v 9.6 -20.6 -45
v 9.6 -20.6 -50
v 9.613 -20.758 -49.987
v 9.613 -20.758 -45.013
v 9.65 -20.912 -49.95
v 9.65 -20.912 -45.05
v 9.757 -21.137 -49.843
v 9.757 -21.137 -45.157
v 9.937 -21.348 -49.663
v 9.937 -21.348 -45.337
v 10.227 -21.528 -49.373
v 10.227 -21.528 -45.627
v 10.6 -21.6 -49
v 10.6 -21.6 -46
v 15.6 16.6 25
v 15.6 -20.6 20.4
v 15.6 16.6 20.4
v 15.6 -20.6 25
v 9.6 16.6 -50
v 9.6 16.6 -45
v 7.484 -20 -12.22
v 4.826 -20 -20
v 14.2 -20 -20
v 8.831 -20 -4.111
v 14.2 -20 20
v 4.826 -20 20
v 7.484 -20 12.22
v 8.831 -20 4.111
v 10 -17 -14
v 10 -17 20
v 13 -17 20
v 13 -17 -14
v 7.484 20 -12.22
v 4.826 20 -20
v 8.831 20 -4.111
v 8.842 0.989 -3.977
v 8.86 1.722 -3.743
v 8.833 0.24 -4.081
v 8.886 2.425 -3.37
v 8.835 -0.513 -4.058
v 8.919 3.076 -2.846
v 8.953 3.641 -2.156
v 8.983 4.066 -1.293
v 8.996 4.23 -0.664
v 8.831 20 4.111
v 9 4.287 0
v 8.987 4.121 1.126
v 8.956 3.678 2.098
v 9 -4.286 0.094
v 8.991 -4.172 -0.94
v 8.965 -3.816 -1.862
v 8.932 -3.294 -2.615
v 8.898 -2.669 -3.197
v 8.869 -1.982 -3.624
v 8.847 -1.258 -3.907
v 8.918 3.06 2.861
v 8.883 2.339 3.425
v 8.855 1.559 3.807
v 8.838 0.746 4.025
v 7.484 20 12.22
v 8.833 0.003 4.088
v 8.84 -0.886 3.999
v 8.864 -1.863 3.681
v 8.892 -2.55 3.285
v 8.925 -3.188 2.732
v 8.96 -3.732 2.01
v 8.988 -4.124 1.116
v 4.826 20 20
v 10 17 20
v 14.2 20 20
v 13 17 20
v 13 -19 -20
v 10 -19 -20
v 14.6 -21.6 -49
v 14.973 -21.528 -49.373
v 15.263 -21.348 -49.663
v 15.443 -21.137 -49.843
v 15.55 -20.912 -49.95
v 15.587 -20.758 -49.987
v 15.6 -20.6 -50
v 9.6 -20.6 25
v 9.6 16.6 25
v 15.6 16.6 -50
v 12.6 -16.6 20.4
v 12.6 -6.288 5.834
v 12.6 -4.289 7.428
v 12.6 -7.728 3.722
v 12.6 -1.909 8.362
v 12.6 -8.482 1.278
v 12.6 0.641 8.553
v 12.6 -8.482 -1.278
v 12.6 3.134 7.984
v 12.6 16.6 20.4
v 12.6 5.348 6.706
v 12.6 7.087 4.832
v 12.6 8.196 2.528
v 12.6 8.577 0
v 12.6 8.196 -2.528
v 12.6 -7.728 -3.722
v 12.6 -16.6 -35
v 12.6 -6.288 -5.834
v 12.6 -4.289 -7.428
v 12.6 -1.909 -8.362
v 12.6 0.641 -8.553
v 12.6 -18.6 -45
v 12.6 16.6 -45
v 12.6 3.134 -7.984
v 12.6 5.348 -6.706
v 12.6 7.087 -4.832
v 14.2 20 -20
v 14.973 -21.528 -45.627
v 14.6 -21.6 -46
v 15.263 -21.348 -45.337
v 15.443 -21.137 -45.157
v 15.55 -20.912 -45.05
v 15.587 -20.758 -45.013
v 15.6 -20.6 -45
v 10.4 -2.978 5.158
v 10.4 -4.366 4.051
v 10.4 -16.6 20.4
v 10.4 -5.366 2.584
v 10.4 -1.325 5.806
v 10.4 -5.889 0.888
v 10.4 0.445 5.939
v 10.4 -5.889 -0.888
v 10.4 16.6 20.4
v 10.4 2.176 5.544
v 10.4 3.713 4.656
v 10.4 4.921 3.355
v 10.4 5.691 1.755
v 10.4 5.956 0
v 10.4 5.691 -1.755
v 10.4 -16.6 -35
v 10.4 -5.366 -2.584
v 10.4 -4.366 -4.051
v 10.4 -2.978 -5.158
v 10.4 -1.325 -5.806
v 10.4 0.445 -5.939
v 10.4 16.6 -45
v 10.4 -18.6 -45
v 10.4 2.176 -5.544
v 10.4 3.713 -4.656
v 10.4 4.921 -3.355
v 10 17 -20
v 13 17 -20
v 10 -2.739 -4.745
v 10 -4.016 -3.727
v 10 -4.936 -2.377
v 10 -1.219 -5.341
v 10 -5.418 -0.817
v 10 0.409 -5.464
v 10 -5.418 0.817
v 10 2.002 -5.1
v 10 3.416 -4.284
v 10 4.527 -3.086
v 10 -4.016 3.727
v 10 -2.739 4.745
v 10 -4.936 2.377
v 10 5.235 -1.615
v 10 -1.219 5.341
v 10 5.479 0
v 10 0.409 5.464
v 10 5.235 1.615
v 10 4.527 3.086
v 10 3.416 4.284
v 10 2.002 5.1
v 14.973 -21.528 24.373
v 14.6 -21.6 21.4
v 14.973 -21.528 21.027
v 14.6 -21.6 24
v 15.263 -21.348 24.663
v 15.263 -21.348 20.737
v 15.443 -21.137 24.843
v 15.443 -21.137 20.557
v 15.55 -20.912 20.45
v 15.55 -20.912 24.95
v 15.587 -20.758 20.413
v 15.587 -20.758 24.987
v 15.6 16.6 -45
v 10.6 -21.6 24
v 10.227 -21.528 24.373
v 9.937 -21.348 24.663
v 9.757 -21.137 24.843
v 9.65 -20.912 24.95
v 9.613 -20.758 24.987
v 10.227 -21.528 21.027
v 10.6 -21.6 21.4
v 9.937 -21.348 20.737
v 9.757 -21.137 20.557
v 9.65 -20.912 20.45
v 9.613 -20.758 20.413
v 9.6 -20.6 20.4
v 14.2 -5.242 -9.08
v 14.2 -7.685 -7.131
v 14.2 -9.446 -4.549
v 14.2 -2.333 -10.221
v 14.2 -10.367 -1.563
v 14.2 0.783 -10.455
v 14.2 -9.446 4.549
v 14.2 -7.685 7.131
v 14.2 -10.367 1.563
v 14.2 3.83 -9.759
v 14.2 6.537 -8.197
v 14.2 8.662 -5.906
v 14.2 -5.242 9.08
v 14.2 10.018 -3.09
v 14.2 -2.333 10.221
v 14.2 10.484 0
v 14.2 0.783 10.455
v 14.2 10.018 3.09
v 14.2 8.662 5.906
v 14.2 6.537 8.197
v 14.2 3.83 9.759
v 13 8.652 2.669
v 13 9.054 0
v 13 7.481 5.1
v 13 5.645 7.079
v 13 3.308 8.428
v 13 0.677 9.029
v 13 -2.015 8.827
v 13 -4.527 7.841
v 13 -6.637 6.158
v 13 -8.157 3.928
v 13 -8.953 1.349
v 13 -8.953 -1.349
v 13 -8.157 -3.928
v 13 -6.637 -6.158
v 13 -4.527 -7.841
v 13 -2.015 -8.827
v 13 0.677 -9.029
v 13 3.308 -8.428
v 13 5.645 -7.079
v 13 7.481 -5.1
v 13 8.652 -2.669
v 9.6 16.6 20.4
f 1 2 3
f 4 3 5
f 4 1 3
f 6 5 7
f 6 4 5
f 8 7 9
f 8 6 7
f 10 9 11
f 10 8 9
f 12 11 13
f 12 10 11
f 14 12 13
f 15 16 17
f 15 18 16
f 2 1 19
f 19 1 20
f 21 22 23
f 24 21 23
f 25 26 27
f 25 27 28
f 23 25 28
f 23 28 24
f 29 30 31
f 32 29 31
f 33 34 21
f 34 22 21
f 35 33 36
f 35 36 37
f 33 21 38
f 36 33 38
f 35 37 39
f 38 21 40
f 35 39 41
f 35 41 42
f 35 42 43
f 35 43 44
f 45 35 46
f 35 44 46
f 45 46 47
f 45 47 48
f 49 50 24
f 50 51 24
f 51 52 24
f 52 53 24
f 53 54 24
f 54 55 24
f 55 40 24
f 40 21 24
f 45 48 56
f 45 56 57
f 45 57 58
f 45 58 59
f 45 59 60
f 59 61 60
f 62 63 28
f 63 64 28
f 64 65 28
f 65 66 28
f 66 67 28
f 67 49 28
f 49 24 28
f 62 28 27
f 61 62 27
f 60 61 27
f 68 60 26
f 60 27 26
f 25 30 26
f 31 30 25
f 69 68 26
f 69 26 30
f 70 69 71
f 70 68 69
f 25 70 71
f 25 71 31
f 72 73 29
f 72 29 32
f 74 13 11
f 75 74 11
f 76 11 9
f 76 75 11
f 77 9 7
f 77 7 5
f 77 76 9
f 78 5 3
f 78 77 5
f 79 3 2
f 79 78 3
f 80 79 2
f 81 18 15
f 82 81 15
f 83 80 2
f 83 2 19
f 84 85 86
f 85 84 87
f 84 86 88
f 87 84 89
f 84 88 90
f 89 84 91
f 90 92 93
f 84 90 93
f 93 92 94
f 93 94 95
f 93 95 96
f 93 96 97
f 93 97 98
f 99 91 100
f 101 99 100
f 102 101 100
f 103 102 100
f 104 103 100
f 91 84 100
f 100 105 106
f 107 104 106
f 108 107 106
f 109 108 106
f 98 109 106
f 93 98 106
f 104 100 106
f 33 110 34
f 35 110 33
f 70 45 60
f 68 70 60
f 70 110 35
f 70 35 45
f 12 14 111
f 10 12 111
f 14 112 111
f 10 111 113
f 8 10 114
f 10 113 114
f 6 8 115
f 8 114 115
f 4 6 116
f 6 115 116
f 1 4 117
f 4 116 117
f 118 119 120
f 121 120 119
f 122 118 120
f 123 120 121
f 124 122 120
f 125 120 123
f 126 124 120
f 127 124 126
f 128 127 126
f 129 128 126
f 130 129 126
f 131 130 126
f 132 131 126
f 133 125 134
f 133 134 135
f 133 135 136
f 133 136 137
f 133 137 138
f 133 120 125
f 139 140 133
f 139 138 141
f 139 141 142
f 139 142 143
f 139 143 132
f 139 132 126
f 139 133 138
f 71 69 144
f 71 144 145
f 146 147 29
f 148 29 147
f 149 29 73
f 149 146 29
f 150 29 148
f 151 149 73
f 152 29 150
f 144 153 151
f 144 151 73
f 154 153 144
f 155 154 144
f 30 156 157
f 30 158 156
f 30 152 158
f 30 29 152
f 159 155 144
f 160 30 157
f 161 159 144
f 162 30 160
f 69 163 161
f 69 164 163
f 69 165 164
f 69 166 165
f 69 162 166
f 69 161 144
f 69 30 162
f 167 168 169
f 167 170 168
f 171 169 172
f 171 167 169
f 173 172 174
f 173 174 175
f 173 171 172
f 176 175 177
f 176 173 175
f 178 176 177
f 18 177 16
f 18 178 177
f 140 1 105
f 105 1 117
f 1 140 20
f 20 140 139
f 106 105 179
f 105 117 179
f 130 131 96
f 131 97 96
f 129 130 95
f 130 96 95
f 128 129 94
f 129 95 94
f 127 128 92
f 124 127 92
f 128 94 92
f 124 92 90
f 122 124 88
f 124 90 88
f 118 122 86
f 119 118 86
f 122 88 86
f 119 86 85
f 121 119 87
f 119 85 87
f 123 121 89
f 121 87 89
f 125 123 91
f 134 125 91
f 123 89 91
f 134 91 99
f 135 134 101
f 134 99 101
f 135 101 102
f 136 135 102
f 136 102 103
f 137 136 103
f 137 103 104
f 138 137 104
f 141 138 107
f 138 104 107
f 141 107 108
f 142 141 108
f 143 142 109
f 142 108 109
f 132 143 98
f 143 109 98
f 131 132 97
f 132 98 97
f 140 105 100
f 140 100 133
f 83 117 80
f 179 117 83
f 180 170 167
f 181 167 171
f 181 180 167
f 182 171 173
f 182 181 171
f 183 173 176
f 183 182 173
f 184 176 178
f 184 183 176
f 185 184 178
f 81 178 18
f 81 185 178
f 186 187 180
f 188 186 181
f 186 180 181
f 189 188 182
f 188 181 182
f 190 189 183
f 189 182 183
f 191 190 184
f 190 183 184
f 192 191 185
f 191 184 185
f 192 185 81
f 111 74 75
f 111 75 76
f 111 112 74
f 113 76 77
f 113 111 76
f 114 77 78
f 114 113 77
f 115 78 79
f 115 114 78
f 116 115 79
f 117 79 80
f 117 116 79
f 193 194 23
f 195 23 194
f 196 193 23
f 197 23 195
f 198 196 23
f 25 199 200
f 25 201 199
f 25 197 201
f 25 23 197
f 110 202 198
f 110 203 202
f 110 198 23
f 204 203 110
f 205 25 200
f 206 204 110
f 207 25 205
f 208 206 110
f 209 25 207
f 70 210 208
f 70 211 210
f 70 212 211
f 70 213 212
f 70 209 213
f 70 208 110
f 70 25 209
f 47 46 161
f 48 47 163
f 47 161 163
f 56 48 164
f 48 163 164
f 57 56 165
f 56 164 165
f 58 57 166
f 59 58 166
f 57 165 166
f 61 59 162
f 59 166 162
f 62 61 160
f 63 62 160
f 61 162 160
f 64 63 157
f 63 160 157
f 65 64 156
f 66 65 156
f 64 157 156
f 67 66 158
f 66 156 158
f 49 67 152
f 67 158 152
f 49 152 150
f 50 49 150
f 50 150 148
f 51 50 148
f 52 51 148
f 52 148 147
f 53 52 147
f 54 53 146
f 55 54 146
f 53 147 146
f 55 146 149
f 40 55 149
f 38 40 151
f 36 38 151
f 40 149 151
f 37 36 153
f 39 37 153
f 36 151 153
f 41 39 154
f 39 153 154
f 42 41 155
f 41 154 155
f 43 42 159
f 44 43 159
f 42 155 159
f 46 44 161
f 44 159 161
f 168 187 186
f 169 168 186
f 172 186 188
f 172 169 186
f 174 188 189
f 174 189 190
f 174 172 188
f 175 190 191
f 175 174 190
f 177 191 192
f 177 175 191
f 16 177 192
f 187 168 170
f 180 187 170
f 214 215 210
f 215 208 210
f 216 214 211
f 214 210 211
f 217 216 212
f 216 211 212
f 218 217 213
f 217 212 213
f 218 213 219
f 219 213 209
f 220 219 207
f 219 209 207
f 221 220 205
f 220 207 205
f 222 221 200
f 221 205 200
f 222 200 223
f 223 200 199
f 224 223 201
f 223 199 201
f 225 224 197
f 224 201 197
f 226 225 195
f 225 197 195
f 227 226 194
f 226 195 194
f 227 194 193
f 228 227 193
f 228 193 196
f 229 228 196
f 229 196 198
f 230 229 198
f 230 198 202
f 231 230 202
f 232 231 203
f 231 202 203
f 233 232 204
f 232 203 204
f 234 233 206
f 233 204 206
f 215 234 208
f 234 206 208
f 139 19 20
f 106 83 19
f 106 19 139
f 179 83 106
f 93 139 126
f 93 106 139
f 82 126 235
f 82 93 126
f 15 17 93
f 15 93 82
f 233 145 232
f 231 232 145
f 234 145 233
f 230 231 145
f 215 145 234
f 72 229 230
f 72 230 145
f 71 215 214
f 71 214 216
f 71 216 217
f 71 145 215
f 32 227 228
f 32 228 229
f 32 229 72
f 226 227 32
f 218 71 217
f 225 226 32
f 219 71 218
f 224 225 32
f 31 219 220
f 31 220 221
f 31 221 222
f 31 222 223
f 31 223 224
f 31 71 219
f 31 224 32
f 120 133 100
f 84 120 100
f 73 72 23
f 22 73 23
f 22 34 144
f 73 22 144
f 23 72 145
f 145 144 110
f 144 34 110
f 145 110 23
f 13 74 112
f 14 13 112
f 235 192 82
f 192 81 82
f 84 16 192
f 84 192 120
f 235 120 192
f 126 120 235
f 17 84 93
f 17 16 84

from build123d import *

# Parameters (mm, degrees)
F0_W           = 3
F0_H           = 3
F1_DEPTH       = 20
F2_R           = 50
F3_DEPTH       = 25
F4_W           = 2.2
F4_H           = 33.2
F5_DEPTH       = 70
F5_DEPTH_BACK  = 5
F7_R           = 3
F8_DEPTH       = 25
F8_TAPER       = -50
F9_W           = 38.2
F9_H           = 4.6
F9_H_2         = 5
F10_DEPTH      = 3
F10_DEPTH_BACK = 3
F11_R          = 1
F12_SIZE2      = 10
F12_SIZE       = 2
F13_SIZE2      = 6
F13_SIZE       = 2


with BuildPart() as f1:
    # F0 (on Top) → F1 (new body, symmetric)
    with BuildSketch(Plane.XY):
        with BuildLine():
            Line((10, 20), (4.6257569496, 20))
            ThreePointArc((4.6257569496, 20), (7.7453156465, 10.2154821845), (8.8, 0))
            ThreePointArc((8.8, 0), (7.7453156465, -10.2154821845), (4.6257569496, -20))
            Line((4.6257569496, -20), (10, -20))
            Line((10, -20), (10, -17))
            Line((10, -17), (10, 17))
            Line((10, 17), (10, 20))
        make_face()
        with Locations((11.5, 18.5)):
            Rectangle(F0_W, F0_H)
        Polygon((14.2, 20), (13, 20), (13, 17), (13, -17), (13, -20), (14.2, -20), align=None)
        with Locations((11.5, -18.5)):
            Rectangle(F0_W, F0_H)
        with BuildLine():
            Line((4.6257569496, 20), (0, 20))
            Line((0, 20), (0, -20))
            Line((0, -20), (4.6257569496, -20))
            ThreePointArc((4.6257569496, -20), (7.7453156465, -10.2154821845), (8.8, 0))
            ThreePointArc((8.8, 0), (7.7453156465, 10.2154821845), (4.6257569496, 20))
        make_face()
    extrude(amount=F1_DEPTH, both=True)

    # F2 (on Front) → F3 (cut, symmetric)
    with BuildSketch(Plane.XZ):
        with Locations((-41, 0)):
            Circle(F2_R)
    extrude(amount=F3_DEPTH, both=True, mode=Mode.SUBTRACT)


with BuildPart() as f5:
    # F4 (on face) → F5 (new body, two sides)
    with BuildSketch(Plane.XY.offset(20)) as f5_sk:
        with Locations((11.5, 0)):
            Rectangle(F4_W, F4_H)
    extrude(amount=-F5_DEPTH)
    extrude(f5_sk.sketch, amount=F5_DEPTH_BACK)


with BuildPart() as f8_tool:
    # F7 (on offset) → F8 (new body)
    with BuildSketch(Plane.YZ.offset(7.92)):
        Circle(F7_R)
    extrude(amount=F8_DEPTH, taper=F8_TAPER)


with BuildPart() as f1_1:
    add(f1.part)

    # F8: cut by f8_tool
    add(f8_tool.part, mode=Mode.SUBTRACT)

    # F13
    f13_edges = [f1_1.edges().sort_by_distance(p)[0] for p in [
        (11.5, -17, -20),
    ]]
    f13_side = f1_1.faces().sort_by_distance((8.770355, 0, -20))[0]
    chamfer(f13_edges, length=F13_SIZE, length2=F13_SIZE2, reference=f13_side)


with BuildPart() as f5_1:
    add(f5.part)

    # F8: cut by f8_tool
    add(f8_tool.part, mode=Mode.SUBTRACT)

    # F9 (on face) → F10 (join, two sides)
    with BuildSketch(Plane.YZ.offset(12.6)) as f10_sk:
        with Locations((-2.5, 22.7)):
            Rectangle(F9_W, F9_H)
        with Locations((-2.5, -47.5)):
            Rectangle(F9_W, F9_H_2)
    extrude(amount=F10_DEPTH)
    extrude(f10_sk.sketch, amount=-F10_DEPTH_BACK)

    # F11
    f11_edges = [f5_1.edges().sort_by_distance(p)[0] for p in [
        (12.6, -21.6, -45),
        (15.6, -21.6, -47.5),
        (12.6, -21.6, -50),
        (9.6, -21.6, -47.5),
        (15.6, -21.6, 22.7),
        (12.6, -21.6, 20.4),
        (9.6, -21.6, 22.7),
        (12.6, -21.6, 25),
    ]]
    fillet(f11_edges, radius=F11_R)

    # F12
    f12_edges = [f5_1.edges().sort_by_distance(p)[0] for p in [
        (11.5, -16.6, -45),
    ]]
    f12_side = f5_1.faces().sort_by_distance((13.135056, -2.972829, -45))[0]
    chamfer(f12_edges, length=F12_SIZE, length2=F12_SIZE2, reference=f12_side)


solid = Compound([f1_1.part, f5_1.part])
